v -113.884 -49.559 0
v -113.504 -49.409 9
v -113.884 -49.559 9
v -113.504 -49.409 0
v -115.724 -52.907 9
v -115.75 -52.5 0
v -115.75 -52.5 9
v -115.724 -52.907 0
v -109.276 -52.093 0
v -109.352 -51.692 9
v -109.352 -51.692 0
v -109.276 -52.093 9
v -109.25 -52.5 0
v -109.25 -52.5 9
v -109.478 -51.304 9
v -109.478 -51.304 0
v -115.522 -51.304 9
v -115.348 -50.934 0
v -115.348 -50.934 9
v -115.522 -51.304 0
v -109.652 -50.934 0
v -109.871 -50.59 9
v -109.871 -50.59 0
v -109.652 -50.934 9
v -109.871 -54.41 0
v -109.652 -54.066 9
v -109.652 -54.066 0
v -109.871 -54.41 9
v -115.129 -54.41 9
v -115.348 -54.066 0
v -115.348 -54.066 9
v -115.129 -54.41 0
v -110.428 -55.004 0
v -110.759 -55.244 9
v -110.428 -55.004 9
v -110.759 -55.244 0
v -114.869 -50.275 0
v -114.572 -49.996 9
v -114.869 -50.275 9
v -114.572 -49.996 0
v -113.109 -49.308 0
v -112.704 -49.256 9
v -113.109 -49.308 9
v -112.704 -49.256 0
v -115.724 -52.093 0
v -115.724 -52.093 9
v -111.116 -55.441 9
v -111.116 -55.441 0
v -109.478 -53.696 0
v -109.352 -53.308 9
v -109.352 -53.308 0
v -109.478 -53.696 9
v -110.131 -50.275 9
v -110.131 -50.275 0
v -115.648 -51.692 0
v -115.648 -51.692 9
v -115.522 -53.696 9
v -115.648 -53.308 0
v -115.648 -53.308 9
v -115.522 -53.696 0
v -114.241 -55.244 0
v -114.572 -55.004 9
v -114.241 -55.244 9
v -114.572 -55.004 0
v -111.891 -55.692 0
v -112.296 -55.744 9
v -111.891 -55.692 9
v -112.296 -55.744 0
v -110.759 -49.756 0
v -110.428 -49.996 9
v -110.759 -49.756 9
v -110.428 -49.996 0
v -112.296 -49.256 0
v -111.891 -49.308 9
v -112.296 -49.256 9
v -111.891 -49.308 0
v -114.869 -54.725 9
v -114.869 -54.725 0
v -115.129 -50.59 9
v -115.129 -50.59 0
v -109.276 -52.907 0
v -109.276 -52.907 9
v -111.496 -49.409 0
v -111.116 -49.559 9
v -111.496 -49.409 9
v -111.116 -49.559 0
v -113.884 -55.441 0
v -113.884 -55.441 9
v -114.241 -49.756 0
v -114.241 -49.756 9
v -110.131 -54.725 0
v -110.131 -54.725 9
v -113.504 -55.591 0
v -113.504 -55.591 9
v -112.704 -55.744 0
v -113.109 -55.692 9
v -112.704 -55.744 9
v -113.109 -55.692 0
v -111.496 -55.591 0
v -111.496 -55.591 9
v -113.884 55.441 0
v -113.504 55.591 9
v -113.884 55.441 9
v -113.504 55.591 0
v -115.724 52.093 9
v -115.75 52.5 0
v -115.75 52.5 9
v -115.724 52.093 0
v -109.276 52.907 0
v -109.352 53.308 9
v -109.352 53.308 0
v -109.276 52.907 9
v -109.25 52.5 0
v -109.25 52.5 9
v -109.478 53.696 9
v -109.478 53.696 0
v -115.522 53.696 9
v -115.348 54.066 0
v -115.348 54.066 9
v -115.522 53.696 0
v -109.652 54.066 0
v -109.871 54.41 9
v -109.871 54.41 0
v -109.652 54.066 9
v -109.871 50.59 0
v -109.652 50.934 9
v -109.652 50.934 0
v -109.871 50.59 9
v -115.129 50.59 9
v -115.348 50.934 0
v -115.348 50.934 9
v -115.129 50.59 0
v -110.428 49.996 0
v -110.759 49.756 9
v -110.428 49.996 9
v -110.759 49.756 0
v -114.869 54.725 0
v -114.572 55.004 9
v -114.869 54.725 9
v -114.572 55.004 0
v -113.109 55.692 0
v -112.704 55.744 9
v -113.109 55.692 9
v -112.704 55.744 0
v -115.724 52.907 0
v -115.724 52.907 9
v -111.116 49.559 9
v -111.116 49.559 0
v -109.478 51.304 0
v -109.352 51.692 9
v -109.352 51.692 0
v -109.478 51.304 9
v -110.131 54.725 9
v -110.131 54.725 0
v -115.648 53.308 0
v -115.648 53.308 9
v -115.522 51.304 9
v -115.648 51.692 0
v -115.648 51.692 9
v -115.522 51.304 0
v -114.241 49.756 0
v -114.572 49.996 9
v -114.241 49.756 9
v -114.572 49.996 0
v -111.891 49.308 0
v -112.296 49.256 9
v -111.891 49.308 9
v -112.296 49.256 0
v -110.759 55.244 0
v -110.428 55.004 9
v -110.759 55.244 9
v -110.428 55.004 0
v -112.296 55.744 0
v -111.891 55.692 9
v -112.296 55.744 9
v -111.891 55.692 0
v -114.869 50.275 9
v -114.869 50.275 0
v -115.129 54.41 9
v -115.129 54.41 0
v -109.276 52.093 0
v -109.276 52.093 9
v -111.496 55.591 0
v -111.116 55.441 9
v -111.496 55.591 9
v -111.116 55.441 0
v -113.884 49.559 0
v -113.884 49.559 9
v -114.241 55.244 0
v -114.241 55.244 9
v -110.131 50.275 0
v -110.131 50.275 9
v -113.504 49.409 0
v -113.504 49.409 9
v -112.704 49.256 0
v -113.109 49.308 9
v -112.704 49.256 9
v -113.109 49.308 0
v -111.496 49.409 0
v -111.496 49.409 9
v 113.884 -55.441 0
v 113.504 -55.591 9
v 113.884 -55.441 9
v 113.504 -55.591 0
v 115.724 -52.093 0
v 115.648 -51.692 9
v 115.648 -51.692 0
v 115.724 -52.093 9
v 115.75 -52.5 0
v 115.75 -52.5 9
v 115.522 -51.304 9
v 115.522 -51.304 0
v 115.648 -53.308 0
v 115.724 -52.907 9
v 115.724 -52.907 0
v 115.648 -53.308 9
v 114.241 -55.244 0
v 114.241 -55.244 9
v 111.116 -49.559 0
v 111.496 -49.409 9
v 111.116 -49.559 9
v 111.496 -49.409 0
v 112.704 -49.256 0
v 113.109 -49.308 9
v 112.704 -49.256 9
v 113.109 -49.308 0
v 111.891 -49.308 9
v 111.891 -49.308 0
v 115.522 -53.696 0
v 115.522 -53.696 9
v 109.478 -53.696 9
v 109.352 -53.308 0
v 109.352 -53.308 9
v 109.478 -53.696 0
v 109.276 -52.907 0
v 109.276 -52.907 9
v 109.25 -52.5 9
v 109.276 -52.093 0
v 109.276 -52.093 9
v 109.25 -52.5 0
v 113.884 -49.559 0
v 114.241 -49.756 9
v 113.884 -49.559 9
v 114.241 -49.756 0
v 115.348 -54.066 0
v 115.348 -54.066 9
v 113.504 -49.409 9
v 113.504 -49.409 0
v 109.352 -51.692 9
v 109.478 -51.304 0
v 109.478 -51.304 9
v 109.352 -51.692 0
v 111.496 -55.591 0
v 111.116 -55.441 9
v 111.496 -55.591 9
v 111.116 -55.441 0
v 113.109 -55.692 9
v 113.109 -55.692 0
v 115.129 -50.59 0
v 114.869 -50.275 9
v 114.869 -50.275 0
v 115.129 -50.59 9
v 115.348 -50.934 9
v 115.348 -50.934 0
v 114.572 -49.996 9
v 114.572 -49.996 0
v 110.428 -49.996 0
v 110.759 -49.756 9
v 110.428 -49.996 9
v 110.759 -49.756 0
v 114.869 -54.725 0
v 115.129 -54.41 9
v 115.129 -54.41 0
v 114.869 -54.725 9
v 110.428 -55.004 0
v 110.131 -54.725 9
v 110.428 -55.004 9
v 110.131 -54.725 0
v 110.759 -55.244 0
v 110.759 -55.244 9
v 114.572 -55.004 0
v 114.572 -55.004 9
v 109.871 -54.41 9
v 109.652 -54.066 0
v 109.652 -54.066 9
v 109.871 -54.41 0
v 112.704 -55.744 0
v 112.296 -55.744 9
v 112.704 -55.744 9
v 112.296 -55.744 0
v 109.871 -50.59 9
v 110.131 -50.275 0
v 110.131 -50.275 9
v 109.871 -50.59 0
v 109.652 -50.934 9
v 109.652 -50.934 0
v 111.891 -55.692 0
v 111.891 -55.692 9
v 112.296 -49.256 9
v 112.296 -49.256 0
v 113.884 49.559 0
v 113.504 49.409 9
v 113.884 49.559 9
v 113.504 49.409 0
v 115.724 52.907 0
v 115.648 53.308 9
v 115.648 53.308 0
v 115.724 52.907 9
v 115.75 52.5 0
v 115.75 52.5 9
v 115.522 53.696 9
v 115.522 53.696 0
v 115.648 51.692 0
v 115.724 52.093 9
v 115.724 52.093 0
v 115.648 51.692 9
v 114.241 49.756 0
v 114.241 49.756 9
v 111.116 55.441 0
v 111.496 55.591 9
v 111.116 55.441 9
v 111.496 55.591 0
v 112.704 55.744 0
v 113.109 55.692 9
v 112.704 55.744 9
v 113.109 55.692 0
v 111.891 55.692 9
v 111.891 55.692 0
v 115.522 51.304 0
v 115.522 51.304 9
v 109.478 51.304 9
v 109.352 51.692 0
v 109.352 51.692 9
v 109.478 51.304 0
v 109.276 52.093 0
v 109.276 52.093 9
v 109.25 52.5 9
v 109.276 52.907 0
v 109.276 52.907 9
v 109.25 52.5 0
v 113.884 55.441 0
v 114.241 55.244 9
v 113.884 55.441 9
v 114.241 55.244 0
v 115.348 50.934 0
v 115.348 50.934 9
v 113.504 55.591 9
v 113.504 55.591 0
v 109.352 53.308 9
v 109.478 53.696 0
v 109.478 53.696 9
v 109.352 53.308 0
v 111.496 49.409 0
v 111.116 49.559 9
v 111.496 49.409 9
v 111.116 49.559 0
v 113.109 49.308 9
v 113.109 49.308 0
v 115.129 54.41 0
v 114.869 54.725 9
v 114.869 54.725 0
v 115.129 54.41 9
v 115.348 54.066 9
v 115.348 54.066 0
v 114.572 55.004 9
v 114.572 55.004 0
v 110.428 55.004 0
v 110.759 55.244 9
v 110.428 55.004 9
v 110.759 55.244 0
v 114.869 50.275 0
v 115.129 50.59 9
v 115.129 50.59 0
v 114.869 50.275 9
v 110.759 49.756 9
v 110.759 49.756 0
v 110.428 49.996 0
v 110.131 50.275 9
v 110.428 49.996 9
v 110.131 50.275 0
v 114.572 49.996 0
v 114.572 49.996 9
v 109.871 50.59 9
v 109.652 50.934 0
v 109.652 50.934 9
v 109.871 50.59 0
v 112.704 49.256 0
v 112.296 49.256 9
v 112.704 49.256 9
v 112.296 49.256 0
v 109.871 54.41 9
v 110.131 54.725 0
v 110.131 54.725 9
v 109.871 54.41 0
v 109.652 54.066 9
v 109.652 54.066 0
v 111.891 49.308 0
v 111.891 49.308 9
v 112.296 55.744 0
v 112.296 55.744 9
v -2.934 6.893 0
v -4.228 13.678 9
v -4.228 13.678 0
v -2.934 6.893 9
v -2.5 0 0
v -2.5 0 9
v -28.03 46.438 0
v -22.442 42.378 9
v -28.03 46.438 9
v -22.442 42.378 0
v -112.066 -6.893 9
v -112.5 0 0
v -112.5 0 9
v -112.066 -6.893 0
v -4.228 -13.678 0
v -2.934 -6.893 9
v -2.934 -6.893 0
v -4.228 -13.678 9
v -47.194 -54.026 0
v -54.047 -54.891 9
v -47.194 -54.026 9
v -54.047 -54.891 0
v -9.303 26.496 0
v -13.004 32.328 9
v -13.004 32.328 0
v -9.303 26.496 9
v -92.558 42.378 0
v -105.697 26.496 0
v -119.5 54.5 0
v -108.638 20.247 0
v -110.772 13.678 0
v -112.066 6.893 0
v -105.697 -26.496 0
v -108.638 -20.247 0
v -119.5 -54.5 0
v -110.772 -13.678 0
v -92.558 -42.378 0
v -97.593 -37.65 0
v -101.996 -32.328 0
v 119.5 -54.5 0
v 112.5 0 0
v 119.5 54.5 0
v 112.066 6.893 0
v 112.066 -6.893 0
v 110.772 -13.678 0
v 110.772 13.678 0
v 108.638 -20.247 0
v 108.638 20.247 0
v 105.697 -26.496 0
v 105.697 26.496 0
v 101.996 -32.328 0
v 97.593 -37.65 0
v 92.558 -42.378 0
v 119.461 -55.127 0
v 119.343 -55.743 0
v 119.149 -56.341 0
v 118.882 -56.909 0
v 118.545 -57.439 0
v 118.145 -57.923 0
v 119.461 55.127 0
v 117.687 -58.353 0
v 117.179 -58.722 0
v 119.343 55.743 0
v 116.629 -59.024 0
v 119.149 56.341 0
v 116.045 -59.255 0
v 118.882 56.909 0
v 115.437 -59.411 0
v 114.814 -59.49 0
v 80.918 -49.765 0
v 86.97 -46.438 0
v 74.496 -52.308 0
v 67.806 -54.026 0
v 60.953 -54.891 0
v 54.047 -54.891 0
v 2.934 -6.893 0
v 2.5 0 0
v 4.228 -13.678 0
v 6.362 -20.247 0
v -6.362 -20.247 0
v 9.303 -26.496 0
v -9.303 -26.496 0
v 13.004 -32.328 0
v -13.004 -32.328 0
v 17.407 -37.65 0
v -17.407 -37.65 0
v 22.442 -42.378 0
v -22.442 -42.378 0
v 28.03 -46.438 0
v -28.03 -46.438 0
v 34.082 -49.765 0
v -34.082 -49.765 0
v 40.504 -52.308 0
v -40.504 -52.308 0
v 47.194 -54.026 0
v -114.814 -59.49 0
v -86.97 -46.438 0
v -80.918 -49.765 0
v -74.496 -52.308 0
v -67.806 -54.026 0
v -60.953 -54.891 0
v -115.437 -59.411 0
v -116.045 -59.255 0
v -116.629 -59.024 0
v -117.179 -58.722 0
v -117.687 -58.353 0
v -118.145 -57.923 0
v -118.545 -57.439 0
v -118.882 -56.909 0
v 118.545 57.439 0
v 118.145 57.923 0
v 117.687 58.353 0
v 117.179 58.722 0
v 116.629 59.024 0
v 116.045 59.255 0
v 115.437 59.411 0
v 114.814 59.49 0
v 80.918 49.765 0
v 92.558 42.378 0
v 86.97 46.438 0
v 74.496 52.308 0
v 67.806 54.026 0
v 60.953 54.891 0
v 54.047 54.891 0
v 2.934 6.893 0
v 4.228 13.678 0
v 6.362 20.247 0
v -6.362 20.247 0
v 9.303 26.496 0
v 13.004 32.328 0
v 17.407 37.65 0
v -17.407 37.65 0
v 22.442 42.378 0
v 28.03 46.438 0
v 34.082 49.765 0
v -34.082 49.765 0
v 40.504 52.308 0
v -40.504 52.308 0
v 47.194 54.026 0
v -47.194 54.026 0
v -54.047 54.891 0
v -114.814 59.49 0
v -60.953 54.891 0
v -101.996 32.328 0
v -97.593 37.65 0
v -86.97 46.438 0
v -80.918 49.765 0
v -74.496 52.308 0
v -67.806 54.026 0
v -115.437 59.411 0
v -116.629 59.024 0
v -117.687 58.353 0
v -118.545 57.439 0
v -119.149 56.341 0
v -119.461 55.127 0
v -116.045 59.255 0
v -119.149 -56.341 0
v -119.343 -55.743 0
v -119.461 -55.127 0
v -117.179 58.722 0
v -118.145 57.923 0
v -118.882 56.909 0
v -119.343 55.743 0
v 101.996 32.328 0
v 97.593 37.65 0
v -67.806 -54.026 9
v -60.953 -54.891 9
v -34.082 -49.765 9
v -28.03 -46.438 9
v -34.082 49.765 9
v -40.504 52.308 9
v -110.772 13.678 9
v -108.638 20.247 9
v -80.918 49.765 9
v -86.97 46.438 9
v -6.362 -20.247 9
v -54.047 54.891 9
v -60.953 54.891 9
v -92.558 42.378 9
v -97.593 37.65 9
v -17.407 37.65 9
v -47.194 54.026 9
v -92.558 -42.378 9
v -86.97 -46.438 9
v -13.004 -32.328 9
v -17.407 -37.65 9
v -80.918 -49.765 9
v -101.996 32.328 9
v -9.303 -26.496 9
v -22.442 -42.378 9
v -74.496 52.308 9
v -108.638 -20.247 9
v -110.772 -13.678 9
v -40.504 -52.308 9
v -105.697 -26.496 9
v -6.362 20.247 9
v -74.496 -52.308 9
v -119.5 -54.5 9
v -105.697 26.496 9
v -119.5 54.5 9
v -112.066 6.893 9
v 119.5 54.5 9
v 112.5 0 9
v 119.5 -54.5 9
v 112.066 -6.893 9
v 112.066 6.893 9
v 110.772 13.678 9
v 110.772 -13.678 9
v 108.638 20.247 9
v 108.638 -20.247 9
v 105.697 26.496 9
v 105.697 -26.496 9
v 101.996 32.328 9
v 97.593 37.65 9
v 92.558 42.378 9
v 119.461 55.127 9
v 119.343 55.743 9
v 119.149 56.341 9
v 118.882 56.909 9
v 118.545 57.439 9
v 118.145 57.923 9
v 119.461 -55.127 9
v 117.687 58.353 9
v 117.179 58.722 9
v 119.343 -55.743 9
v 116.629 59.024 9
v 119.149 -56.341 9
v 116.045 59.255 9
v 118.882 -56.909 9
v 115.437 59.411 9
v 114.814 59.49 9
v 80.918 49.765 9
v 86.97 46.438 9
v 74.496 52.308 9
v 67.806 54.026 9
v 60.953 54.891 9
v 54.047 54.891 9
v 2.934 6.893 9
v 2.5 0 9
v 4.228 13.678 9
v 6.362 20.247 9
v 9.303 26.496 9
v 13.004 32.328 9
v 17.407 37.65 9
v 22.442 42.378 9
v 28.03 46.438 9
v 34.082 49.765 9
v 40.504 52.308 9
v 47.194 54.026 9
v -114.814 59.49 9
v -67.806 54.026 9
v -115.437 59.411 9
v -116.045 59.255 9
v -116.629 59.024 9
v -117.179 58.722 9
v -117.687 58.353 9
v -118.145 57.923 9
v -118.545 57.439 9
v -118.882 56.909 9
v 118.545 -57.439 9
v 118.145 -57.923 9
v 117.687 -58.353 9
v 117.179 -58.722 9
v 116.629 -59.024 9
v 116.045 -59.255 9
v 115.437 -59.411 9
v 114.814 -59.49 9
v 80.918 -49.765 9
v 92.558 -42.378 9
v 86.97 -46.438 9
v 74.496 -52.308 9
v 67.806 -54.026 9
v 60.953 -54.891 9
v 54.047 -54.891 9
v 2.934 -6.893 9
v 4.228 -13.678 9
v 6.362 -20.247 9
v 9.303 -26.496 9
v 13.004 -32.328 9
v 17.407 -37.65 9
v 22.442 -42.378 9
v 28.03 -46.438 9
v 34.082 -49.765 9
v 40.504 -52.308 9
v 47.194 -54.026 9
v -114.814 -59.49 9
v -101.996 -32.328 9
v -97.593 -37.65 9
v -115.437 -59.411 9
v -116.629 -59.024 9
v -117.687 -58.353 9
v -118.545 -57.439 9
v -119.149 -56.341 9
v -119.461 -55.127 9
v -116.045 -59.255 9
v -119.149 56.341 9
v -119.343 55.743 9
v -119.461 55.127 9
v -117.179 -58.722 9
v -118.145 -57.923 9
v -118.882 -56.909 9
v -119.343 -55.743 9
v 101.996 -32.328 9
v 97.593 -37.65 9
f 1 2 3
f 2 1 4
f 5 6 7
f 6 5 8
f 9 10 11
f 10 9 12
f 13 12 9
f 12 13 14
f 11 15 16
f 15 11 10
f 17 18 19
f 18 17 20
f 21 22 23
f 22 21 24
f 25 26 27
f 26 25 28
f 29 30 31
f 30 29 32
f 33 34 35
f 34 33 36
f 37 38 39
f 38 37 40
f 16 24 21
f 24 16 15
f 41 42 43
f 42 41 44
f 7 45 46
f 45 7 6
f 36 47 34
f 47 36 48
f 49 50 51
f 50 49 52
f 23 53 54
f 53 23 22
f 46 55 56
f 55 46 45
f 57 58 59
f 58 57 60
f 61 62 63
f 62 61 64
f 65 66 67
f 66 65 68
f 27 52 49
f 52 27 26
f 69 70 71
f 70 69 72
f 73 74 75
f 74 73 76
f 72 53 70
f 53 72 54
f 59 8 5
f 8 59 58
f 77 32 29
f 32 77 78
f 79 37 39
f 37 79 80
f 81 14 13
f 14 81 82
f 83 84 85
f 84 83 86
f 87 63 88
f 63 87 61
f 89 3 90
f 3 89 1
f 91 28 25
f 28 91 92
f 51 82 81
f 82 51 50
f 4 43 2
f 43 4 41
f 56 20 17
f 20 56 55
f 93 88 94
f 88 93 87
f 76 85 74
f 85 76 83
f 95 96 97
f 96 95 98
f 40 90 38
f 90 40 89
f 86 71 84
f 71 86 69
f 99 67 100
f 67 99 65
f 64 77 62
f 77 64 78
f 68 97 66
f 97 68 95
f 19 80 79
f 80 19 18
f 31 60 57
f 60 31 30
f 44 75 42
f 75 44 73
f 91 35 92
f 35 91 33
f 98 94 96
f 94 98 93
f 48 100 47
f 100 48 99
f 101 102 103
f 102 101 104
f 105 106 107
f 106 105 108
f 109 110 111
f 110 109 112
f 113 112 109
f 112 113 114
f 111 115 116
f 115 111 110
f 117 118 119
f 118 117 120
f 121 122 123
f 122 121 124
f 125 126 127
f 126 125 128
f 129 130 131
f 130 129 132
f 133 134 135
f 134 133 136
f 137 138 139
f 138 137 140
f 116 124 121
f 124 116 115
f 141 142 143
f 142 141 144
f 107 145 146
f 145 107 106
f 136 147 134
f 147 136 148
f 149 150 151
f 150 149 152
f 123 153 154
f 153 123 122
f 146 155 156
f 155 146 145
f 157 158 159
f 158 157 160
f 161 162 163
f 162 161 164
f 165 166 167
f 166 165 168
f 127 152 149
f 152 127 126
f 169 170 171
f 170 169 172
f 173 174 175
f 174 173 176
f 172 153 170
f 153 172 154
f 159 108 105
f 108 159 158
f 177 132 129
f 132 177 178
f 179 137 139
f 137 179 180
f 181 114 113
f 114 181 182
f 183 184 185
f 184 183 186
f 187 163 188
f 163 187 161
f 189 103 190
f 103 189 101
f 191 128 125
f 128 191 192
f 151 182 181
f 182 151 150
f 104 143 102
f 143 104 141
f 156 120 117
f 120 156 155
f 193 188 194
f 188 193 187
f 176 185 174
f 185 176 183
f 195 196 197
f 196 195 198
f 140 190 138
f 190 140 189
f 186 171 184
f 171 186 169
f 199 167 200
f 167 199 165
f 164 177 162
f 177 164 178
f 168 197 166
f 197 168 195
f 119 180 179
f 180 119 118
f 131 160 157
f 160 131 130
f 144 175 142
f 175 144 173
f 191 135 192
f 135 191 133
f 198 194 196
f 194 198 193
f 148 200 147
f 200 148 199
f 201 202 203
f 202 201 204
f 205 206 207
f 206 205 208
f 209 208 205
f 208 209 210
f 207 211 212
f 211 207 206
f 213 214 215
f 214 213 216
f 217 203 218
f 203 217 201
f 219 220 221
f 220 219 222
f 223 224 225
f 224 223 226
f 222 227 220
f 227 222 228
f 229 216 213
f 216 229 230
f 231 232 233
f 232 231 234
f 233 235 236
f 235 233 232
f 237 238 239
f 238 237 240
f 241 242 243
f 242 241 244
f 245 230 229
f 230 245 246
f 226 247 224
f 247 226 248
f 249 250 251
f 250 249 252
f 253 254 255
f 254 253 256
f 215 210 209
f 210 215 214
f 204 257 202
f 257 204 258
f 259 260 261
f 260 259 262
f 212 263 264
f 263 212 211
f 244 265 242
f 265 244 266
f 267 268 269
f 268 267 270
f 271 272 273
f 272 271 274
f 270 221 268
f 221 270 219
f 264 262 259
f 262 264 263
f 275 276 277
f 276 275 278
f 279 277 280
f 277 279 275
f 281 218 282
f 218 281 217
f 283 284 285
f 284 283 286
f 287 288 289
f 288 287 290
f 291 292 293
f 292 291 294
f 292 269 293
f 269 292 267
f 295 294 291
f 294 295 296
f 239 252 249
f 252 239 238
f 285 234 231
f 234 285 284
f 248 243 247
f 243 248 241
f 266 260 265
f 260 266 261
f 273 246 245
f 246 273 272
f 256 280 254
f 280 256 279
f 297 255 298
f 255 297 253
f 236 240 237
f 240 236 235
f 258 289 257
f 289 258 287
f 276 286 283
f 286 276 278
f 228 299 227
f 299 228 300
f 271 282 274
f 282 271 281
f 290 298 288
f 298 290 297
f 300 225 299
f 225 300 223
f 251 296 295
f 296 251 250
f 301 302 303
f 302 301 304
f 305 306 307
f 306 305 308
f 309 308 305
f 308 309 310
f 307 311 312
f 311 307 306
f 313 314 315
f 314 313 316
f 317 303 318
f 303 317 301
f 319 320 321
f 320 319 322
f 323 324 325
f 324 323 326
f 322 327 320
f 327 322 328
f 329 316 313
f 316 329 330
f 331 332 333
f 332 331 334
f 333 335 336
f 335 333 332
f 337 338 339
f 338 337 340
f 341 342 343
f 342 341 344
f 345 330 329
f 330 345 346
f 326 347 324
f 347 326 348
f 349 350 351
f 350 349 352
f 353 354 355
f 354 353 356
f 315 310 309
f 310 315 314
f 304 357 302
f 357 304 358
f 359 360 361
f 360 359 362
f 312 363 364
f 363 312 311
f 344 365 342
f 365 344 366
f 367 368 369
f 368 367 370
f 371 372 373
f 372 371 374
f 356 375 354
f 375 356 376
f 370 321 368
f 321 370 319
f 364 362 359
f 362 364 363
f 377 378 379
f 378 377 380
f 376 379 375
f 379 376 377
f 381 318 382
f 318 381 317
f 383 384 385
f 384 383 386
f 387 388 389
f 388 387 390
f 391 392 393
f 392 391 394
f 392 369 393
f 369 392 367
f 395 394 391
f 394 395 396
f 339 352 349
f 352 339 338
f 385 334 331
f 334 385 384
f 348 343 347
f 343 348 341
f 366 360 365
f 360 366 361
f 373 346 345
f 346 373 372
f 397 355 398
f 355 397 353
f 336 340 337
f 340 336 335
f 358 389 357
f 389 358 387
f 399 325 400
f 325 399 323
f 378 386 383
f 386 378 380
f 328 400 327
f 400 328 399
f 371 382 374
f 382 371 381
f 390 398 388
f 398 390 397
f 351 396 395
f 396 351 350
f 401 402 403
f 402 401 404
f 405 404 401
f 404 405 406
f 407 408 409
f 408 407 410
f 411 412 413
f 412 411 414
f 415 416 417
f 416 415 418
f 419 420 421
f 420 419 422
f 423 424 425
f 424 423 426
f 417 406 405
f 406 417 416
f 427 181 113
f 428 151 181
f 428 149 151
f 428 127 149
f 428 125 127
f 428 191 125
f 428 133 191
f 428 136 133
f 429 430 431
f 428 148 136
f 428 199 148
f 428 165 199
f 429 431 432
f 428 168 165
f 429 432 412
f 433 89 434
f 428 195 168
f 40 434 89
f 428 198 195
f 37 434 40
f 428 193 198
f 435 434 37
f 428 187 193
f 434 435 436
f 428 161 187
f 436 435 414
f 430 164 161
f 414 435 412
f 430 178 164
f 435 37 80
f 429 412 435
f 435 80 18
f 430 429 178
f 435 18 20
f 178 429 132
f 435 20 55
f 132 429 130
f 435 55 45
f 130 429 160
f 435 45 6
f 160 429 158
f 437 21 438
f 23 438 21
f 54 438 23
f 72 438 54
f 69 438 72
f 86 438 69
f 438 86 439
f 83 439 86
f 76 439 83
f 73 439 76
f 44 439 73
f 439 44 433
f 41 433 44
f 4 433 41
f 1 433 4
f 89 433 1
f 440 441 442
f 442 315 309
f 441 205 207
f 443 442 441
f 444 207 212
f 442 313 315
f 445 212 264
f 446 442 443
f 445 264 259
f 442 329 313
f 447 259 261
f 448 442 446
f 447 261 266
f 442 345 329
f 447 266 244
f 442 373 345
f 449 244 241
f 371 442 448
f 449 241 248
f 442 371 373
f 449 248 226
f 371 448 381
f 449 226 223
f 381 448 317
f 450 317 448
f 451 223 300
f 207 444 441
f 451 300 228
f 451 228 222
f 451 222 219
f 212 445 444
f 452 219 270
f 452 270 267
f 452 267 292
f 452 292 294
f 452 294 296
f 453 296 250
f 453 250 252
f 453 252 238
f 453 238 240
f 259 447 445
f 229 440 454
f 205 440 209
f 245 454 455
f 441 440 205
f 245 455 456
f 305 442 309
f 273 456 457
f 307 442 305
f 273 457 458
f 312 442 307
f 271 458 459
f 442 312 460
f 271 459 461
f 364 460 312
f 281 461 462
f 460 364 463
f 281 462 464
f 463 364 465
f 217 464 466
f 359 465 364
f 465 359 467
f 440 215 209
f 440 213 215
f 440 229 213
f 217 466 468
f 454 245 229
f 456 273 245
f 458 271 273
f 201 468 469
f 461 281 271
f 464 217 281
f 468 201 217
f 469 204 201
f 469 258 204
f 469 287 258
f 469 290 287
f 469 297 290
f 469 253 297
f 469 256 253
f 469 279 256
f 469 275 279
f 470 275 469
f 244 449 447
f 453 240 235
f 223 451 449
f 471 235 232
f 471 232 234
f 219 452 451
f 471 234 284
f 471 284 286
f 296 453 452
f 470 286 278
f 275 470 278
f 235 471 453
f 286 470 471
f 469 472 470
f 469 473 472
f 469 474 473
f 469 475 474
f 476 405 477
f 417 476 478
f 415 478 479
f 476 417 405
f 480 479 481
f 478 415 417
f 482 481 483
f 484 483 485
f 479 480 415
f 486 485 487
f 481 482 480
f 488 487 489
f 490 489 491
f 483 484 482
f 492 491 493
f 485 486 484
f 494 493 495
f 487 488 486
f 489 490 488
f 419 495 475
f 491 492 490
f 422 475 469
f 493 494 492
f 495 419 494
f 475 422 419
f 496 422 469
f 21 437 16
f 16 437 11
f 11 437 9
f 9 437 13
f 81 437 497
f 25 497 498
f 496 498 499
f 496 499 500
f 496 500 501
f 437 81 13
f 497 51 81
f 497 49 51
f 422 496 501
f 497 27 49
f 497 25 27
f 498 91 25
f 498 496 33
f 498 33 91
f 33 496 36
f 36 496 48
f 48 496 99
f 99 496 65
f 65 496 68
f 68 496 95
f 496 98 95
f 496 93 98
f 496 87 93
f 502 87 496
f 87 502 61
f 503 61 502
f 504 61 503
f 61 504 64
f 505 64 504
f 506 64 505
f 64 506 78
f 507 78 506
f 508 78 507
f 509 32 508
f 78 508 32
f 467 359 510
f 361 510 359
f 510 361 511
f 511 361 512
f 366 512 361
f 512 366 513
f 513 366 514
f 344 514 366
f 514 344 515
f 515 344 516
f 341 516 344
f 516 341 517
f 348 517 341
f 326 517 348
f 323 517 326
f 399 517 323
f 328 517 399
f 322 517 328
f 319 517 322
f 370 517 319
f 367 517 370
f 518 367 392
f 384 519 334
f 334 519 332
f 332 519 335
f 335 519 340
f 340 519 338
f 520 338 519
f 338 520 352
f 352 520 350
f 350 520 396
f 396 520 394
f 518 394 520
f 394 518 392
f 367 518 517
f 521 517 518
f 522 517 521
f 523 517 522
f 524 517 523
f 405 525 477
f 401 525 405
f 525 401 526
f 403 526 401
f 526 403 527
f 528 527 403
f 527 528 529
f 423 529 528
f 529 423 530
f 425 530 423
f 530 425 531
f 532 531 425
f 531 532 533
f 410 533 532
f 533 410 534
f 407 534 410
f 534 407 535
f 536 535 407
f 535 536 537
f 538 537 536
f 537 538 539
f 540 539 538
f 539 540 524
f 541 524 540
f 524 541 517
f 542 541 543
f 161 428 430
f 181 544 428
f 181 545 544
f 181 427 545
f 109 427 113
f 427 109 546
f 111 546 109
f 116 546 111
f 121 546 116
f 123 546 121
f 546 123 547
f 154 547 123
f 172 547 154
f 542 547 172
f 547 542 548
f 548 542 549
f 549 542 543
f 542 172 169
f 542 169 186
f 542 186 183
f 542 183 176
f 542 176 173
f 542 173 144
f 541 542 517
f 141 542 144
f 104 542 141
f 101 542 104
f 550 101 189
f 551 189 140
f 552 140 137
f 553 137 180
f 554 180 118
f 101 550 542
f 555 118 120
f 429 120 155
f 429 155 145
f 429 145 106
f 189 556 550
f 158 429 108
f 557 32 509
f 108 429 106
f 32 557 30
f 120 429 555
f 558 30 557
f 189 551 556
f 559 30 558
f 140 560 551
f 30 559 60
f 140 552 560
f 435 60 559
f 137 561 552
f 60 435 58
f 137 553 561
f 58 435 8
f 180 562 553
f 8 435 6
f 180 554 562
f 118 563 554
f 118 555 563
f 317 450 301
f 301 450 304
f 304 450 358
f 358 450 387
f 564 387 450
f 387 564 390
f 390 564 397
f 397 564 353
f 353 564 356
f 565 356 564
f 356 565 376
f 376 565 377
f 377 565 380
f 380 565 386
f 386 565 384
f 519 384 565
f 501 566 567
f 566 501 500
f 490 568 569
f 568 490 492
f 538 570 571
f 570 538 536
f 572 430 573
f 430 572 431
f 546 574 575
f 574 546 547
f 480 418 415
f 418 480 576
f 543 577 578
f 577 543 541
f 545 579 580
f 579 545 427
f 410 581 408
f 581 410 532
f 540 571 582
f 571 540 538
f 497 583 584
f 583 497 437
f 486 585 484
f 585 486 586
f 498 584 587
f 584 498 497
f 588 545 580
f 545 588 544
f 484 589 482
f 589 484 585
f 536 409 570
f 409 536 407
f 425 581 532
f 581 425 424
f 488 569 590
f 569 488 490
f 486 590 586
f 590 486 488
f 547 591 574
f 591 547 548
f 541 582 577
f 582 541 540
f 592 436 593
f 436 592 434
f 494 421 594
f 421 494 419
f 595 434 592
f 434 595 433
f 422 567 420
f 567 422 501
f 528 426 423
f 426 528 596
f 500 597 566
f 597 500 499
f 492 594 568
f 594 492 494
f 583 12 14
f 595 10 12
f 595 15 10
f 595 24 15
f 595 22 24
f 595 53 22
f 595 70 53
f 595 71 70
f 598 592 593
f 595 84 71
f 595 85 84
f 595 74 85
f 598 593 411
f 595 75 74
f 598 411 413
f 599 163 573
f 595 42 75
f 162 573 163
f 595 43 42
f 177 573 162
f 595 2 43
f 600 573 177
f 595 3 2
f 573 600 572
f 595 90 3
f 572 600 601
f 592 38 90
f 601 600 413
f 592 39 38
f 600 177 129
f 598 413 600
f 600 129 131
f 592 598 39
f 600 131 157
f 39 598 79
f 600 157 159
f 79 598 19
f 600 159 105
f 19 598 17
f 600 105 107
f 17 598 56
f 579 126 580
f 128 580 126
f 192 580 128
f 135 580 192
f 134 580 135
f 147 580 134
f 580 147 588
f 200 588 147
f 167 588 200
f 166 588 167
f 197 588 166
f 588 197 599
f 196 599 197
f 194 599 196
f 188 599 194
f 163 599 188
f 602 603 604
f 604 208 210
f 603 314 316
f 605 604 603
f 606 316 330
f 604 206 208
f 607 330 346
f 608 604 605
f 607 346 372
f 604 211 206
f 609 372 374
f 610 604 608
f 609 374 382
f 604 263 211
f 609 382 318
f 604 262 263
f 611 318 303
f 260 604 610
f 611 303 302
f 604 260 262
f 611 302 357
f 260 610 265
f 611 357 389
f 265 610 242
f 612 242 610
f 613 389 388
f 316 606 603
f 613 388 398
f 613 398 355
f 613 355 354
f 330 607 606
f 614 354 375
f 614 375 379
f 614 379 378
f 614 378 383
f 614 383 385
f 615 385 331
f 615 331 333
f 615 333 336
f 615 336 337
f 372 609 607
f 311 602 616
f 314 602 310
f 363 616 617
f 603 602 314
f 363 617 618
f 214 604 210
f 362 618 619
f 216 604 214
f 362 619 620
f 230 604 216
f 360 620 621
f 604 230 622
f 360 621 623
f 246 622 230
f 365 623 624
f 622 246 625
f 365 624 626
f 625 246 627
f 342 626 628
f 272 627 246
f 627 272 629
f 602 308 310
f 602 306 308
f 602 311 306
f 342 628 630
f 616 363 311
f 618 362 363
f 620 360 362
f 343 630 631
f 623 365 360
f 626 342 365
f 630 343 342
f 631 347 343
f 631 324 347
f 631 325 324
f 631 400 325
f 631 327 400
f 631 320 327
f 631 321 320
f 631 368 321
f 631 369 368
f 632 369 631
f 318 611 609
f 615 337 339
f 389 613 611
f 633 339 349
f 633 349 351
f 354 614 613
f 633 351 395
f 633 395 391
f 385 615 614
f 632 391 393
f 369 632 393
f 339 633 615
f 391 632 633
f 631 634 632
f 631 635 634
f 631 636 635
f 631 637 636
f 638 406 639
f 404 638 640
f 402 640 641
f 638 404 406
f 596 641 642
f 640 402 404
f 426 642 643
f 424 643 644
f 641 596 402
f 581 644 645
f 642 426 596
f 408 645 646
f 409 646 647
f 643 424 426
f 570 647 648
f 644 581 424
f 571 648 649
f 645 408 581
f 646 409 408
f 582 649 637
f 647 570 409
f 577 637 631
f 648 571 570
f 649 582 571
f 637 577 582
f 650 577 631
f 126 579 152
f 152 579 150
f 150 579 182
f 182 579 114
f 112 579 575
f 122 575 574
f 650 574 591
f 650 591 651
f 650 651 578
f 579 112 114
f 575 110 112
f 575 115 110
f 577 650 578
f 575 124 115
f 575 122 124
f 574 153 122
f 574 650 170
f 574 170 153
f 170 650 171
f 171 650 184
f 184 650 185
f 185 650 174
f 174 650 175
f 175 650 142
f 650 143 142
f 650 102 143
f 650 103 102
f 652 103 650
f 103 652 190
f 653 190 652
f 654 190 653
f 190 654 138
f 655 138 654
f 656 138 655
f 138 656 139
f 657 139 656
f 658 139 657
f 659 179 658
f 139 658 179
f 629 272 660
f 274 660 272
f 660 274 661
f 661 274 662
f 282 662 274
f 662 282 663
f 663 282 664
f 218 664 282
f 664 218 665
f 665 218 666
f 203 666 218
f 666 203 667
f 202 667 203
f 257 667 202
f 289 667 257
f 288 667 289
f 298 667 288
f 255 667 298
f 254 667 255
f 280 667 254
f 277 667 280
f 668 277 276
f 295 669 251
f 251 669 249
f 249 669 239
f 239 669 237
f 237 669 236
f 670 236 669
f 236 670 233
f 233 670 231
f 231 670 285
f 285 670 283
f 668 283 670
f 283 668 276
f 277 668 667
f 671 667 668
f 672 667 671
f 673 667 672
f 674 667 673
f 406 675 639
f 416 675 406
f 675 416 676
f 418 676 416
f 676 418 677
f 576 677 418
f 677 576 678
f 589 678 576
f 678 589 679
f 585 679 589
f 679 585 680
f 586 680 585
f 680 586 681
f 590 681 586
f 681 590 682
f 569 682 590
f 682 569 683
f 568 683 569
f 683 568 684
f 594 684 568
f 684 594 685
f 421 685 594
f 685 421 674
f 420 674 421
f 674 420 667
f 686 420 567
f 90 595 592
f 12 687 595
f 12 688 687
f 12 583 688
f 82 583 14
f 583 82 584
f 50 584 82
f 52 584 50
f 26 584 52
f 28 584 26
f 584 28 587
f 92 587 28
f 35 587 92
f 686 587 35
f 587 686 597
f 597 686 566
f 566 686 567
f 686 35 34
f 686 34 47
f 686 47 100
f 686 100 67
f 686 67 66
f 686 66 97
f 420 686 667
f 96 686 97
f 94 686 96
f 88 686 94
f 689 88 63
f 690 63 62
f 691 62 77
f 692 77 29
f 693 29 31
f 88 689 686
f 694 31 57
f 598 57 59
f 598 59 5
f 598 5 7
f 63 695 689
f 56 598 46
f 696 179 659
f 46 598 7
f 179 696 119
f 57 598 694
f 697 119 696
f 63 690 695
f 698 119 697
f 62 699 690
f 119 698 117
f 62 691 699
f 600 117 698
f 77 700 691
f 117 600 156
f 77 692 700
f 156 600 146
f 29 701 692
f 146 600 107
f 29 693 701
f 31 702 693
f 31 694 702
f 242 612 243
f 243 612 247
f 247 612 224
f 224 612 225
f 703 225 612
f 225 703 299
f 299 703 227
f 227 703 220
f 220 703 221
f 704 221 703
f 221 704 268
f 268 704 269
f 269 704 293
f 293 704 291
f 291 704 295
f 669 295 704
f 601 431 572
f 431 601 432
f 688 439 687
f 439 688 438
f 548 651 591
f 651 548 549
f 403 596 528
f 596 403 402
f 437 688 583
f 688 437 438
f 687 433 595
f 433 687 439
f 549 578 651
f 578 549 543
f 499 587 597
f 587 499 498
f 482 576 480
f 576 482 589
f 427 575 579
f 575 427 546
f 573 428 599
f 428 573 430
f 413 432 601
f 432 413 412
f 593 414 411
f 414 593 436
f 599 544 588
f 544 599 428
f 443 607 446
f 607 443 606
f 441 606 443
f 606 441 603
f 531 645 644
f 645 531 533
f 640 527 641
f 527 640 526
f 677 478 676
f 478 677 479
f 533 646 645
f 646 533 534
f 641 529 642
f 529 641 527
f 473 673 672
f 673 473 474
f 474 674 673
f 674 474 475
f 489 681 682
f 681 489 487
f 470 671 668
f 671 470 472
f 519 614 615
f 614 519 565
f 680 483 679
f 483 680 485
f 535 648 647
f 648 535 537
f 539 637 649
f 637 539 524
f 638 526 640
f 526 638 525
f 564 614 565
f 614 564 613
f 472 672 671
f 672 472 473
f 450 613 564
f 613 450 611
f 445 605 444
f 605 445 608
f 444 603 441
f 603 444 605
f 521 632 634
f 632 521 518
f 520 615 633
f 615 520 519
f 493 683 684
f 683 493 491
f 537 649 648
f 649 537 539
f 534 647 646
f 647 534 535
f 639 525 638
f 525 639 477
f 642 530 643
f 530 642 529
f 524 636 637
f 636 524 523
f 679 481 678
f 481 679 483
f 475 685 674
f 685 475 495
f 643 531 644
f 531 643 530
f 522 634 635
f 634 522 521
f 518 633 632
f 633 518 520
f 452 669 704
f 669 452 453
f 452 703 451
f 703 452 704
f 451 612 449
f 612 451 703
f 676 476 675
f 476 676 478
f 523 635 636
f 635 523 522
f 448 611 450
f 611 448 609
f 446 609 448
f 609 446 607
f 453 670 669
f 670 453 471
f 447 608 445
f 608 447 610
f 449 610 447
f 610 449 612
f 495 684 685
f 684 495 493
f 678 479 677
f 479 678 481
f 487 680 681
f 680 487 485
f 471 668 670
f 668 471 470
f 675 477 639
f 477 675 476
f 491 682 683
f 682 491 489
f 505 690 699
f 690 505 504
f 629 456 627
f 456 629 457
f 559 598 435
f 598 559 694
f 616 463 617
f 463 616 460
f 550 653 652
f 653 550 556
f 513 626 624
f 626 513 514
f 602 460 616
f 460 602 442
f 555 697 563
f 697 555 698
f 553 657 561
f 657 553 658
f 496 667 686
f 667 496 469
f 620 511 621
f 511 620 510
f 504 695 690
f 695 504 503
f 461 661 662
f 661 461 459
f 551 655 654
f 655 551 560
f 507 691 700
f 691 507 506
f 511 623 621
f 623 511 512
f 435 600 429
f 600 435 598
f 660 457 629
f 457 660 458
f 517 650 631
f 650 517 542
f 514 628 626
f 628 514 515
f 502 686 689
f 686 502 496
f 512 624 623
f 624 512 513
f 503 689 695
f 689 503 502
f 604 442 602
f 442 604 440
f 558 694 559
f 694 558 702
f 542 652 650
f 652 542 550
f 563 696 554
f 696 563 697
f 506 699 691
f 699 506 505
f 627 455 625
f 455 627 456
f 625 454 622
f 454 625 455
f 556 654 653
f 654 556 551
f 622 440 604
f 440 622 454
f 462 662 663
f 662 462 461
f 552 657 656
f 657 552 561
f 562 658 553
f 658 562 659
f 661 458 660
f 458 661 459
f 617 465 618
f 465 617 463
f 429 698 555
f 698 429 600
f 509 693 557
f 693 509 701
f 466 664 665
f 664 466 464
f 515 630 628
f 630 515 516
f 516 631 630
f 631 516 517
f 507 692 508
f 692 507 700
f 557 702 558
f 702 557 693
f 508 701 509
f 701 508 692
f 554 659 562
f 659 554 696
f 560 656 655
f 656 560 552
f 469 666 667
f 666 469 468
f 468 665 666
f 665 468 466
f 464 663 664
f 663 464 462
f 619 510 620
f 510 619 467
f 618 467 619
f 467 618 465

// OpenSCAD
$fn = 50;


difference() {
	union() {
		hull() {
			translate(v = [-114.5000000000, 54.5000000000, 0]) {
				cylinder(h = 9, r = 5);
			}
			translate(v = [114.5000000000, 54.5000000000, 0]) {
				cylinder(h = 9, r = 5);
			}
			translate(v = [-114.5000000000, -54.5000000000, 0]) {
				cylinder(h = 9, r = 5);
			}
			translate(v = [114.5000000000, -54.5000000000, 0]) {
				cylinder(h = 9, r = 5);
			}
		}
	}
	union() {
		#translate(v = [-112.5000000000, -52.5000000000, -100.0000000000]) {
			cylinder(h = 200, r = 3.2500000000);
		}
		#translate(v = [-112.5000000000, 52.5000000000, -100.0000000000]) {
			cylinder(h = 200, r = 3.2500000000);
		}
		#translate(v = [112.5000000000, -52.5000000000, -100.0000000000]) {
			cylinder(h = 200, r = 3.2500000000);
		}
		#translate(v = [112.5000000000, 52.5000000000, -100.0000000000]) {
			cylinder(h = 200, r = 3.2500000000);
		}
		#translate(v = [-57.5000000000, 0, 0]) {
			cylinder(h = 9, r = 55.0000000000);
		}
		#translate(v = [57.5000000000, 0, 0]) {
			cylinder(h = 9, r = 55.0000000000);
		}
	}
}
